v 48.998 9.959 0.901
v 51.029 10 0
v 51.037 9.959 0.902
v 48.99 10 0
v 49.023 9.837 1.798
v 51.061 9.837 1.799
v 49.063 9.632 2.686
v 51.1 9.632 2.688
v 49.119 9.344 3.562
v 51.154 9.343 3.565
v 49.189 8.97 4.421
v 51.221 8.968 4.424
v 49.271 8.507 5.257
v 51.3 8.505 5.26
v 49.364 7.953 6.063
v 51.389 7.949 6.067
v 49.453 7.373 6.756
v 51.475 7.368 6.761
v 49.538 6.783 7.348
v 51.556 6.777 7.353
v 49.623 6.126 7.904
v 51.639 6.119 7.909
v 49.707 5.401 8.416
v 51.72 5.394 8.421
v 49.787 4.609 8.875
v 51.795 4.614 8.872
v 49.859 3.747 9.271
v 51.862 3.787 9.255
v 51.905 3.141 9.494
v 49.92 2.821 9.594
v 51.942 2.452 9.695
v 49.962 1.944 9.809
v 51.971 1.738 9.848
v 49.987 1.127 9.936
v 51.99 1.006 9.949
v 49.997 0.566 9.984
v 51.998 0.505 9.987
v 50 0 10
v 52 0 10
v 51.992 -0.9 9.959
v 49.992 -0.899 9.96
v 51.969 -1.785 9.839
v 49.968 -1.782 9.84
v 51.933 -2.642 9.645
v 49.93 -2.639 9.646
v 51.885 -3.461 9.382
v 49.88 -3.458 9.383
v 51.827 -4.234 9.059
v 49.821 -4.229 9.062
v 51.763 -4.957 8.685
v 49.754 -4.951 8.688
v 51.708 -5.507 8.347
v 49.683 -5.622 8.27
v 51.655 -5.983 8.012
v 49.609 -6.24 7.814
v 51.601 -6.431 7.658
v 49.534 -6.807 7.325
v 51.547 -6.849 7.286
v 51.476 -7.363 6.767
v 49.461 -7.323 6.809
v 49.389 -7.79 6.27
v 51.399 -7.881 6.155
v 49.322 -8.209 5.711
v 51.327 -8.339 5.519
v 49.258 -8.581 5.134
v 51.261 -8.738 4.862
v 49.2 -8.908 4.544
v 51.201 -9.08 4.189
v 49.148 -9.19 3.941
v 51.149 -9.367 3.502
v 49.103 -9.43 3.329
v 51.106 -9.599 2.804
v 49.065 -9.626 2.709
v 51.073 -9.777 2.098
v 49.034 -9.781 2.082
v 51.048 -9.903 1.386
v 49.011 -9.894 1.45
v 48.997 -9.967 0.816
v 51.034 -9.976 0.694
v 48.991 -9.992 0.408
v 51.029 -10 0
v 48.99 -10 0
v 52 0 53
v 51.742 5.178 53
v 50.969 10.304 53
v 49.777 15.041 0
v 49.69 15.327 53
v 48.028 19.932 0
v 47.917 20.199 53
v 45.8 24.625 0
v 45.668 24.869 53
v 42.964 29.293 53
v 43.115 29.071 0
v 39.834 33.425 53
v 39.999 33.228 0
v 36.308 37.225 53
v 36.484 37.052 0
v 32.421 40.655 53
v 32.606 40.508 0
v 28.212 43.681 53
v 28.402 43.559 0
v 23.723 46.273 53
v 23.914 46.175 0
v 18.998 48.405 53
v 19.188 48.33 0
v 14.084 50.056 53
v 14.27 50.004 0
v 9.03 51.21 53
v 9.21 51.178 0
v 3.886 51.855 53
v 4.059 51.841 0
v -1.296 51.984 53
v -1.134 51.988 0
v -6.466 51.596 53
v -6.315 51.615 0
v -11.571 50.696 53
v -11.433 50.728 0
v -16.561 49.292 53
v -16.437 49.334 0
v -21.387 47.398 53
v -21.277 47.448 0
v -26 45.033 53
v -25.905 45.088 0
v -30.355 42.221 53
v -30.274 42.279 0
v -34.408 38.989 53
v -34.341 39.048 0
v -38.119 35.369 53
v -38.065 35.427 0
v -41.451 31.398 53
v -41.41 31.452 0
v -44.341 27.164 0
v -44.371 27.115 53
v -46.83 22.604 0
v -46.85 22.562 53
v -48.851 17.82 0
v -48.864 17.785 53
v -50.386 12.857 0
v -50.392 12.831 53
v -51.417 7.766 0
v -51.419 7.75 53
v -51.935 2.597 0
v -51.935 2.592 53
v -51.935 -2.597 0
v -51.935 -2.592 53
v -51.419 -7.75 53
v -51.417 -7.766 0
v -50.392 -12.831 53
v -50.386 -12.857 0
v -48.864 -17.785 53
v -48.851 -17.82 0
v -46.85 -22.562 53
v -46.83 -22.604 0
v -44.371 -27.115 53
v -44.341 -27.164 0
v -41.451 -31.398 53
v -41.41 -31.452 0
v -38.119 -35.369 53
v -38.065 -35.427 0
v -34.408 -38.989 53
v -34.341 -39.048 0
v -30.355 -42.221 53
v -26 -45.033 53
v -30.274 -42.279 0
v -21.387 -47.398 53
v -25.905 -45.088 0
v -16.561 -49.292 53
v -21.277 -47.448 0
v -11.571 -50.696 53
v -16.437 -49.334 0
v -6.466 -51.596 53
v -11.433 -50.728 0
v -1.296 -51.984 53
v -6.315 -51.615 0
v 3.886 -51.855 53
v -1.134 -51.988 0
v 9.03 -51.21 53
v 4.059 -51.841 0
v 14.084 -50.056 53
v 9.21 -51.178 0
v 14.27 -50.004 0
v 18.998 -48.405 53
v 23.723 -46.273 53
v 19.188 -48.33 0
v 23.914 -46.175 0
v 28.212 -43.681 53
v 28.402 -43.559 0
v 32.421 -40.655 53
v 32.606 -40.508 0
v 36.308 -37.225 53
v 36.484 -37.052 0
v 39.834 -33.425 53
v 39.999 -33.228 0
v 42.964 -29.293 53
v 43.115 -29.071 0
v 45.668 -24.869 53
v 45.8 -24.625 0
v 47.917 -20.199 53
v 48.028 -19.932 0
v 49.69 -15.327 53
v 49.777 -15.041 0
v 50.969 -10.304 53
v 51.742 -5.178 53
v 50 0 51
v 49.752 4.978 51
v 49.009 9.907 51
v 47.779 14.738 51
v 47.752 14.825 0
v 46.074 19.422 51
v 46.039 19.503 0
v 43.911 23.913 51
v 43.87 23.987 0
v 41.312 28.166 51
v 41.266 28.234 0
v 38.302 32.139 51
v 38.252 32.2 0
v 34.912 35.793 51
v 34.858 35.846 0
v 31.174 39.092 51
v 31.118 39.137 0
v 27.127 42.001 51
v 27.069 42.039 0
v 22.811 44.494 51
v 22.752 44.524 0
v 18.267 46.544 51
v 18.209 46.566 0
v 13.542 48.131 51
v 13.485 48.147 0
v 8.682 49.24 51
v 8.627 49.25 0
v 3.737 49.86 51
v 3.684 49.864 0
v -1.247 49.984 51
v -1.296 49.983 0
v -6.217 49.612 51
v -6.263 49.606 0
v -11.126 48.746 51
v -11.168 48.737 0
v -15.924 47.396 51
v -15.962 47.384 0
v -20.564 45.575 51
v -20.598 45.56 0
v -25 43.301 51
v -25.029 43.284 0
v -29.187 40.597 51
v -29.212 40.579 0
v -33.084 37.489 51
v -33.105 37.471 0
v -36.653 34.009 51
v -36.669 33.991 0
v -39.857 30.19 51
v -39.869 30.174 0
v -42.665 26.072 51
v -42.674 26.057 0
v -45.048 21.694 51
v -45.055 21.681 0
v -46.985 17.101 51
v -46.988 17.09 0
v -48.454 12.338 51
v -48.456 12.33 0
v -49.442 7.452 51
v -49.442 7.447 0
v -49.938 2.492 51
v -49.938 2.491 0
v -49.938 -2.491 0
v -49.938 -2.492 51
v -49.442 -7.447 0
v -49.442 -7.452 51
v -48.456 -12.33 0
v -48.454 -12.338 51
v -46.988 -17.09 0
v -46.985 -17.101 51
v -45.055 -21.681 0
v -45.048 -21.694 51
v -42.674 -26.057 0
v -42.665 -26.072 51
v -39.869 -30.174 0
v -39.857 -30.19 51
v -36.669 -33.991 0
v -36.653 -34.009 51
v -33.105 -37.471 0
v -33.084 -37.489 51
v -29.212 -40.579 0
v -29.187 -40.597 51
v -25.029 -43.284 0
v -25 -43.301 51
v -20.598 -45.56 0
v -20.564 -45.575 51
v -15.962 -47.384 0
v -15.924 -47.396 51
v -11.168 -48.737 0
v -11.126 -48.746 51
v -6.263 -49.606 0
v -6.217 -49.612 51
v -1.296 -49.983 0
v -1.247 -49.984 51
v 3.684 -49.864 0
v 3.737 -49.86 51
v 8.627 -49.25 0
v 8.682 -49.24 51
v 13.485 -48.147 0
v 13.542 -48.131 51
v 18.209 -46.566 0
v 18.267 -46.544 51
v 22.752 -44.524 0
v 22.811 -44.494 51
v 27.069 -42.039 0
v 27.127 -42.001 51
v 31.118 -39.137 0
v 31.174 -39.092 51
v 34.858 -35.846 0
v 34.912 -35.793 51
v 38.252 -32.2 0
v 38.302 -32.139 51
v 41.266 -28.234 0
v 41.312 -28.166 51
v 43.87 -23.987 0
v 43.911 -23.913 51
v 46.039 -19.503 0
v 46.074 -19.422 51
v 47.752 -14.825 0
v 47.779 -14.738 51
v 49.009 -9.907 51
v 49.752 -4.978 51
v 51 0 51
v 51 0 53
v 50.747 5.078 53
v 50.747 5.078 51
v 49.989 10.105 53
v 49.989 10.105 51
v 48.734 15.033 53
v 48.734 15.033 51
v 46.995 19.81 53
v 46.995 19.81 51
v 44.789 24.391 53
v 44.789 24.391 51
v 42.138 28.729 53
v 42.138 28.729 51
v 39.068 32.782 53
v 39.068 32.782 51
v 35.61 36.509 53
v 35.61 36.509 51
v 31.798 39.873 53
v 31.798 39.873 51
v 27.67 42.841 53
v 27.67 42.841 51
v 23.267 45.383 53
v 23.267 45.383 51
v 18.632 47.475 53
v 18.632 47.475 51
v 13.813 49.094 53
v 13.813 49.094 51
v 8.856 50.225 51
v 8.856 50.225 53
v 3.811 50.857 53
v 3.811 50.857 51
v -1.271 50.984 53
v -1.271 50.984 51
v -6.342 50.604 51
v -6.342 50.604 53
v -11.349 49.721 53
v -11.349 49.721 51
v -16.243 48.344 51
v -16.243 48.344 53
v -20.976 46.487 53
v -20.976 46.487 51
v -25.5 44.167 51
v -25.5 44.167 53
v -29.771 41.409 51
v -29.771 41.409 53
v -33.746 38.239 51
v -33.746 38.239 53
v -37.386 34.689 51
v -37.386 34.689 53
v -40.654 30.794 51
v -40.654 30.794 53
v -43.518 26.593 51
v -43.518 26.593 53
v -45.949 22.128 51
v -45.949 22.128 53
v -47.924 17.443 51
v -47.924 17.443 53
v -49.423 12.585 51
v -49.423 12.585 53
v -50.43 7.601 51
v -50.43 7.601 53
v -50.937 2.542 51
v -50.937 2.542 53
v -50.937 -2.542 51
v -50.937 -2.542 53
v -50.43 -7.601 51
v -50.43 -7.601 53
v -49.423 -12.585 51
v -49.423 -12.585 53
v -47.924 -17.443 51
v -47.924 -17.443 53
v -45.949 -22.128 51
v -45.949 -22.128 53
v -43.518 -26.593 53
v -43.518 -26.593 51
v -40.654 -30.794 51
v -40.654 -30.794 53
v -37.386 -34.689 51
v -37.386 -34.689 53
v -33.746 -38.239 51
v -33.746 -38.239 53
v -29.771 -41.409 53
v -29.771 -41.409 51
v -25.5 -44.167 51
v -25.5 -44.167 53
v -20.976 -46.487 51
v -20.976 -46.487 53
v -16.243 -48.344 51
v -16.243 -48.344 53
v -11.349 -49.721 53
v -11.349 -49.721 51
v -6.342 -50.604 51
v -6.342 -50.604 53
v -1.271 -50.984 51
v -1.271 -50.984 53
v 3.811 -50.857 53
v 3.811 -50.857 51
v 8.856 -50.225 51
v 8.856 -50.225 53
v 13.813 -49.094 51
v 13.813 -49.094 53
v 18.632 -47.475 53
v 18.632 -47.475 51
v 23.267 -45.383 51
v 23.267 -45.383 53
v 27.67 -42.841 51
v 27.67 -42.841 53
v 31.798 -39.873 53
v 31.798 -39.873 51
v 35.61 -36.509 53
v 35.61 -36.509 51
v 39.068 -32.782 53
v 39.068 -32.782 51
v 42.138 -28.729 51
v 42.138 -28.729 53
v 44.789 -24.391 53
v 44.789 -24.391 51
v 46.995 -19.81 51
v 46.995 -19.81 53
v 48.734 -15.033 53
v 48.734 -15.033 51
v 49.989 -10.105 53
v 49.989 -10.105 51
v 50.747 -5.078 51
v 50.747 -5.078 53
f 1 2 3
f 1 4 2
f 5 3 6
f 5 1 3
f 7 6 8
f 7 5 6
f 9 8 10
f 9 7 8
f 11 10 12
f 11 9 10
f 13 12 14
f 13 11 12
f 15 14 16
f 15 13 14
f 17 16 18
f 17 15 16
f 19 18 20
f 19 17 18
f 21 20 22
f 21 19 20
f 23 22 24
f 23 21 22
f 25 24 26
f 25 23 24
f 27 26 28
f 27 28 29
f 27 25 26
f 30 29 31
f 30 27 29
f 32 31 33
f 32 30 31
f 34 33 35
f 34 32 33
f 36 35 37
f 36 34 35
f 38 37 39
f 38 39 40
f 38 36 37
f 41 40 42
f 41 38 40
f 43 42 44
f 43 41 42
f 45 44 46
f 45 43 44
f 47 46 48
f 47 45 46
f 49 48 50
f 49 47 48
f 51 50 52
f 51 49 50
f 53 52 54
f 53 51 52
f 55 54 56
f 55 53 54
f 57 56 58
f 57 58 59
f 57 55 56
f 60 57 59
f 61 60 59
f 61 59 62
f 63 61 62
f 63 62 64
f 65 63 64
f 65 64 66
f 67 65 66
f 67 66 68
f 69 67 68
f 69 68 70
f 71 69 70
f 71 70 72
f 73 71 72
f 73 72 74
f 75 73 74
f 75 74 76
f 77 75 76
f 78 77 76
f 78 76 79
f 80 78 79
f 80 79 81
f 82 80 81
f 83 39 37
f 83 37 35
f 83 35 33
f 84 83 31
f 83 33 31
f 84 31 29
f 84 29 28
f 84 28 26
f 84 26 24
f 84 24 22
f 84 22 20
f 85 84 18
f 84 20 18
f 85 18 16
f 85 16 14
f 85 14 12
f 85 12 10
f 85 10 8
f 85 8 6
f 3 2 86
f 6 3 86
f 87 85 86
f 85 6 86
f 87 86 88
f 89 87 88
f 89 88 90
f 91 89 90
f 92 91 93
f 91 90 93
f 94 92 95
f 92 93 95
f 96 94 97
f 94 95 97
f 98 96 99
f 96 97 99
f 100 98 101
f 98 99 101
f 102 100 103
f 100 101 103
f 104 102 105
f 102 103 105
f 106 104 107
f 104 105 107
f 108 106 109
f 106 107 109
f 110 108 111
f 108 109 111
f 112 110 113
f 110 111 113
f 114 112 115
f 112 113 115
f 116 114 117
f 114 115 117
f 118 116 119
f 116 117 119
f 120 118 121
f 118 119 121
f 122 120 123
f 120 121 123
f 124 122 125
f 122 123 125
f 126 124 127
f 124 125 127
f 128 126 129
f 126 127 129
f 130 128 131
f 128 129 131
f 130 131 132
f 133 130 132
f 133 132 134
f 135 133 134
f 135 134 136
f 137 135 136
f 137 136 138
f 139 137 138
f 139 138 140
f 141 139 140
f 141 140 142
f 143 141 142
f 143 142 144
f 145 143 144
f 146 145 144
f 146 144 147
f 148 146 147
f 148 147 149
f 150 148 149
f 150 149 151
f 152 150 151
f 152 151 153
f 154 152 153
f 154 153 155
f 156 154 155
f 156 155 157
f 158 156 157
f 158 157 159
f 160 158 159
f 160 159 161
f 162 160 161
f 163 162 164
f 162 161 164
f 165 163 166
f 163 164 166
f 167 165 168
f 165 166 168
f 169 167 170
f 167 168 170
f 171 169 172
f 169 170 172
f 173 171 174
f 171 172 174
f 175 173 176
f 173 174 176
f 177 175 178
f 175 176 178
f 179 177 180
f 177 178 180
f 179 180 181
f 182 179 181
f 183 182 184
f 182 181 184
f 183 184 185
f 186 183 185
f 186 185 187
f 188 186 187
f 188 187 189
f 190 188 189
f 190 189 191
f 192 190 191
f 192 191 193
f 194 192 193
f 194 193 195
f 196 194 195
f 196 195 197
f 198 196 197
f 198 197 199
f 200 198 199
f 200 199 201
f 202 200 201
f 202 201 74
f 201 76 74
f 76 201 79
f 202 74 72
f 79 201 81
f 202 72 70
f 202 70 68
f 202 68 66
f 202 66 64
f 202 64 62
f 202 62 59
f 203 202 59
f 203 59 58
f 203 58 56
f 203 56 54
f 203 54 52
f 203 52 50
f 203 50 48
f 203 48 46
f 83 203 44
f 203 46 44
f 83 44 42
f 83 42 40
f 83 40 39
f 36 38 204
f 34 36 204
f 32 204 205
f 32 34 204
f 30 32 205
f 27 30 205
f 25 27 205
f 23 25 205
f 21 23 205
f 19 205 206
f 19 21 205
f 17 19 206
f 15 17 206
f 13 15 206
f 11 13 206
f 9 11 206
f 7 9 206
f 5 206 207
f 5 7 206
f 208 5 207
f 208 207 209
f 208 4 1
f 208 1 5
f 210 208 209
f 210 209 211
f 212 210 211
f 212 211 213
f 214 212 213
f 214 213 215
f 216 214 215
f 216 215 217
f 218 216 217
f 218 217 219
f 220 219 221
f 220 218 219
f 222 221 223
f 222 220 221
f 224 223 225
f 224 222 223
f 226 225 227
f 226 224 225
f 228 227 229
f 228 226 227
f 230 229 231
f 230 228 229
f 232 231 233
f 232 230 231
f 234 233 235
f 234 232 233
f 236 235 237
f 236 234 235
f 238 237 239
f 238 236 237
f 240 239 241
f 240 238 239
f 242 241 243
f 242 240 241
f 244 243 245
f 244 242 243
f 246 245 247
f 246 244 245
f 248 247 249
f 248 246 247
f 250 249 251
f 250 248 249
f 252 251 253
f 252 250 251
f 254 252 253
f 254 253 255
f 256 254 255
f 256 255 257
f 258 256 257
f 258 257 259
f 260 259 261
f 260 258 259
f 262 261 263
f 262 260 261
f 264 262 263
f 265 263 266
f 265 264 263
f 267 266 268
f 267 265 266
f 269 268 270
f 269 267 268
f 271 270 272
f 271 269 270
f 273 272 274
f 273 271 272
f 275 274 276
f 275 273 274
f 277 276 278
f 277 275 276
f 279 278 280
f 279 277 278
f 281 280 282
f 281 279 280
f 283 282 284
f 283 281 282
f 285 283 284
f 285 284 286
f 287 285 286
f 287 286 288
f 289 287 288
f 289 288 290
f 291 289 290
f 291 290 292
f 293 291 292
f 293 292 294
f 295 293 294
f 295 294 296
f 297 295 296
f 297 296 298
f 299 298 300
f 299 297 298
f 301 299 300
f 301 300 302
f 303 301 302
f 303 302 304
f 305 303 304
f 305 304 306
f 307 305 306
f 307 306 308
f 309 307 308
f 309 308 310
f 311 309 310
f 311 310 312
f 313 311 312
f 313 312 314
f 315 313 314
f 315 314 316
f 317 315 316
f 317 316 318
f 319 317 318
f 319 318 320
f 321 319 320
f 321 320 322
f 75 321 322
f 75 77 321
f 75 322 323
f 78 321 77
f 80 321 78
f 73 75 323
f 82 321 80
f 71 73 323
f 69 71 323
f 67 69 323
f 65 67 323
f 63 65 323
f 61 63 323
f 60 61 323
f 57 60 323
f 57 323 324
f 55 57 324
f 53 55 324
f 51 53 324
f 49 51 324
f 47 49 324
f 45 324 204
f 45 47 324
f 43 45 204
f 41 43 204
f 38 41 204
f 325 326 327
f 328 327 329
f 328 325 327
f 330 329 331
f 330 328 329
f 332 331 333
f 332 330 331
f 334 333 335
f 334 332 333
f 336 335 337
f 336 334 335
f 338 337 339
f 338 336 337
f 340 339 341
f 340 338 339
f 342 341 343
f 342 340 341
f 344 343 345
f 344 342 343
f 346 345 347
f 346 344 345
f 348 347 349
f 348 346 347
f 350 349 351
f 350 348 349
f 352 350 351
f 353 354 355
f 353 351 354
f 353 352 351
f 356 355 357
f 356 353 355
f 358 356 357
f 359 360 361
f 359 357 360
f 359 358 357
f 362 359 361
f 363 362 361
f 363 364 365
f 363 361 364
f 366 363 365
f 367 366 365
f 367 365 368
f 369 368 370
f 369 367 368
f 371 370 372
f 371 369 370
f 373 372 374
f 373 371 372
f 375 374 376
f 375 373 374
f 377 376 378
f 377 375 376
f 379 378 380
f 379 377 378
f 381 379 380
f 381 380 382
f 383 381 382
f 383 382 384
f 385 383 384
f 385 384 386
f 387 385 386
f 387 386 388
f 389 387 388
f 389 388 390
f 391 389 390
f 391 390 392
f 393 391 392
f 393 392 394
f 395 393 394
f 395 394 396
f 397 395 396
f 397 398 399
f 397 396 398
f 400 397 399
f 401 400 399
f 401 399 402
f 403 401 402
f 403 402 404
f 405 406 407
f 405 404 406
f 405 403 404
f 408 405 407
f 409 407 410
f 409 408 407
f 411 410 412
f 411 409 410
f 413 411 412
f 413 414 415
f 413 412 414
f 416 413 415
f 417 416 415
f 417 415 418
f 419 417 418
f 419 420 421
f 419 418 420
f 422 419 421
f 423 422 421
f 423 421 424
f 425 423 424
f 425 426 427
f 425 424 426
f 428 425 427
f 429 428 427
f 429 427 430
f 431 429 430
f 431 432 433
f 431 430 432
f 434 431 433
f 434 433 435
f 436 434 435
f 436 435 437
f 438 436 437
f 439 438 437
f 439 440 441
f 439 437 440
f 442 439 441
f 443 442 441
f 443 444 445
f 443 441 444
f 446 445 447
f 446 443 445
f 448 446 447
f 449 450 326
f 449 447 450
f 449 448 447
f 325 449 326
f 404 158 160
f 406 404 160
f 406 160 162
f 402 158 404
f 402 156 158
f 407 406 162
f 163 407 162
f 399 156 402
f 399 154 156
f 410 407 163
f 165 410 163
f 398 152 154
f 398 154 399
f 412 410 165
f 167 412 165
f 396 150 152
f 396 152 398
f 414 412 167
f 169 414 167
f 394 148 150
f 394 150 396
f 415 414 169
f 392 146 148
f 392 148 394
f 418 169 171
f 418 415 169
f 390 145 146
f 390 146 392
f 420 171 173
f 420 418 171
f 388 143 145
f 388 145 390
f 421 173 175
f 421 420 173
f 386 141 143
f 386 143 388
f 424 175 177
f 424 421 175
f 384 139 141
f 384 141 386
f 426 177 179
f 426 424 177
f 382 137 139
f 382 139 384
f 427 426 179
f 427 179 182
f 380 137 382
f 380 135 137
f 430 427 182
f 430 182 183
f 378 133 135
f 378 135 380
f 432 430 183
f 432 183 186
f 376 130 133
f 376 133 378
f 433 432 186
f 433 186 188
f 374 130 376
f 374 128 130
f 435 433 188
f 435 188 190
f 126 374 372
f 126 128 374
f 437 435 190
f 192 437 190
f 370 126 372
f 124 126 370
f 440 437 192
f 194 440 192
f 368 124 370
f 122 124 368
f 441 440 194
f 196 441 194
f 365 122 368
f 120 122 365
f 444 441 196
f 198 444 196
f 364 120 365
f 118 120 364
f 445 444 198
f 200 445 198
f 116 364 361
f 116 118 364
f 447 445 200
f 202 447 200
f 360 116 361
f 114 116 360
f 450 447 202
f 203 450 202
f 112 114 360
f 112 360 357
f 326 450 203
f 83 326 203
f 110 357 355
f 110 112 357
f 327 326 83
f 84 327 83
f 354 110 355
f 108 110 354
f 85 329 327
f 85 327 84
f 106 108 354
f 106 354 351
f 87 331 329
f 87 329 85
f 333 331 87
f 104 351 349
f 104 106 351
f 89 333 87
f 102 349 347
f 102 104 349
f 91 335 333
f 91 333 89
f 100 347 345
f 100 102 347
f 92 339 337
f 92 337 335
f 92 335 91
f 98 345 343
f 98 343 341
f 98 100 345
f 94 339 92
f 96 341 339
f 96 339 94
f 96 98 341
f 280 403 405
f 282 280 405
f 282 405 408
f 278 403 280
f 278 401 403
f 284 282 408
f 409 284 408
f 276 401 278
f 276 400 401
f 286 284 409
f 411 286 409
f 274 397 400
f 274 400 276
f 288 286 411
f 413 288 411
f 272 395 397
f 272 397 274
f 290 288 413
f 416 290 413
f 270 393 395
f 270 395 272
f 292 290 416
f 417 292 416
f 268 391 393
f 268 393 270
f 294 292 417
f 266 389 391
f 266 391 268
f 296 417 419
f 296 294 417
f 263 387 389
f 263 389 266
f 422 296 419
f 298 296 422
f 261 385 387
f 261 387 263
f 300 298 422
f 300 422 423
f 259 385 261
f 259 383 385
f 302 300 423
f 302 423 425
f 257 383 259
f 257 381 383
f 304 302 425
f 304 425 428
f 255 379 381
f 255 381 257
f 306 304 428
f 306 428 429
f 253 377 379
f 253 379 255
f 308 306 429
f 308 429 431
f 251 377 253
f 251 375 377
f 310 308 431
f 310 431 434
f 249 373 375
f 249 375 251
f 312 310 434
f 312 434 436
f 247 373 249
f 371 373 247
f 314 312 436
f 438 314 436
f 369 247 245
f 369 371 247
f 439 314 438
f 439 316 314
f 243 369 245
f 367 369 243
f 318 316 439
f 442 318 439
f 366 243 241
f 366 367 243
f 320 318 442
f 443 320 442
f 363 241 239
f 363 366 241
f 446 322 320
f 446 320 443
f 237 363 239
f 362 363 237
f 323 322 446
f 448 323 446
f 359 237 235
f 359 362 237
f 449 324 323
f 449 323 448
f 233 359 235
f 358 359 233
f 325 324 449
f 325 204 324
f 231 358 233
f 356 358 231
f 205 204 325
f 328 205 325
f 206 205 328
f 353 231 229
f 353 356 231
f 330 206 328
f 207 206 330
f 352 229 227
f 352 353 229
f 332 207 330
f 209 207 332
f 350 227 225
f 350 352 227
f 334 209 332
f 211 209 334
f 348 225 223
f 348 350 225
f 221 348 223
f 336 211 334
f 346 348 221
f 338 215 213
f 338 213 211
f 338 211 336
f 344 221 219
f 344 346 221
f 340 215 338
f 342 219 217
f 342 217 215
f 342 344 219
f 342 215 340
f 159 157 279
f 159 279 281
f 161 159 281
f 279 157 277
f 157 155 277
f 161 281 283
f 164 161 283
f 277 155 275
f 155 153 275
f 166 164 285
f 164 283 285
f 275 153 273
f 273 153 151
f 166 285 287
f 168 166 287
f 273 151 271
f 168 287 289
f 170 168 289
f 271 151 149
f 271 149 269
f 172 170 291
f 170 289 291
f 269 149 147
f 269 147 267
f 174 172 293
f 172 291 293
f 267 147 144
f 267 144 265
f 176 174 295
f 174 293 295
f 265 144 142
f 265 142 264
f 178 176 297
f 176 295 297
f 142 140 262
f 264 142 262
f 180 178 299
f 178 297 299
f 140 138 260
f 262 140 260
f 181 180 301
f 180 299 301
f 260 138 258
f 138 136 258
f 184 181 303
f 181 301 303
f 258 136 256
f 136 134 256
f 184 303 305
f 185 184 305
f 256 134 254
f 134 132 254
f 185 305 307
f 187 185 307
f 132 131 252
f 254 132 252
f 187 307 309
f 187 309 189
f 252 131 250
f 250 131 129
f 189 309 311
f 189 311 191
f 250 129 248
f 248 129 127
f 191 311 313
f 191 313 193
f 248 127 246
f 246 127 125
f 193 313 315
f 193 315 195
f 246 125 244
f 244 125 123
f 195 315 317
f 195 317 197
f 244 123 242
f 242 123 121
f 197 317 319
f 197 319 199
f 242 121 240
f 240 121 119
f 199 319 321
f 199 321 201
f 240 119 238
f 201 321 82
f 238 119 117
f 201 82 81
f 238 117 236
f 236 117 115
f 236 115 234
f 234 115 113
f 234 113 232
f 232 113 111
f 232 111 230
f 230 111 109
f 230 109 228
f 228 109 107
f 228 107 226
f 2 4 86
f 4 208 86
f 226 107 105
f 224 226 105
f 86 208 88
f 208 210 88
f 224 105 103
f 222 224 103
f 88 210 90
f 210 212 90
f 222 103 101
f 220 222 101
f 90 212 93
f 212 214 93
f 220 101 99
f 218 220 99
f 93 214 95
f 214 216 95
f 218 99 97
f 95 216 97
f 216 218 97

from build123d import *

# Parameters (mm, degrees)
CYLINDER009_R           = 51
CYLINDER009_DEPTH       = 16
CYLINDER006_R           = 10
CYLINDER006_DEPTH       = 10
CYLINDER006_PITCH_ANGLE = 90
CYLINDER005_R           = 50
CYLINDER005_DEPTH       = 67
CYLINDER004_R           = 52
CYLINDER004_DEPTH       = 53


with BuildPart() as cylinder004:
    # Cylinder009 → Cylinder009 (new body)
    with BuildSketch(Plane.XY.offset(51)):
        Circle(CYLINDER009_R)
    extrude(amount=CYLINDER009_DEPTH)


with BuildPart() as wire_hole:
    # Cylinder006 → Cylinder006 (new body)
    with BuildSketch(Plane.XY):
        Circle(CYLINDER006_R)
    extrude(amount=CYLINDER006_DEPTH)


with BuildPart() as wire_hole_1:
    # Cylinder006 pitch: moved
    add(wire_hole.part.rotate(Axis((0, 0, 0), (0, 1, 0)), CYLINDER006_PITCH_ANGLE))


with BuildPart() as wire_hole_2:
    # Cylinder006 placement: moved
    add(wire_hole_1.part.moved(Location((45, 0, 0))))


with BuildPart() as inner:
    # Cylinder005 → Cylinder005 (new body)
    with BuildSketch(Plane.XY):
        Circle(CYLINDER005_R)
    extrude(amount=CYLINDER005_DEPTH)


with BuildPart() as case_with_edge:
    # Cylinder004 → Cylinder004 (new body)
    with BuildSketch(Plane.XY):
        Circle(CYLINDER004_R)
    extrude(amount=CYLINDER004_DEPTH)

    # Cut002: cut Inner
    add(inner.part, mode=Mode.SUBTRACT)

    # Cut003: cut Wire hole
    add(wire_hole_2.part, mode=Mode.SUBTRACT)

    # Cut005: cut Cylinder004
    add(cylinder004.part, mode=Mode.SUBTRACT)


solid = case_with_edge.part
